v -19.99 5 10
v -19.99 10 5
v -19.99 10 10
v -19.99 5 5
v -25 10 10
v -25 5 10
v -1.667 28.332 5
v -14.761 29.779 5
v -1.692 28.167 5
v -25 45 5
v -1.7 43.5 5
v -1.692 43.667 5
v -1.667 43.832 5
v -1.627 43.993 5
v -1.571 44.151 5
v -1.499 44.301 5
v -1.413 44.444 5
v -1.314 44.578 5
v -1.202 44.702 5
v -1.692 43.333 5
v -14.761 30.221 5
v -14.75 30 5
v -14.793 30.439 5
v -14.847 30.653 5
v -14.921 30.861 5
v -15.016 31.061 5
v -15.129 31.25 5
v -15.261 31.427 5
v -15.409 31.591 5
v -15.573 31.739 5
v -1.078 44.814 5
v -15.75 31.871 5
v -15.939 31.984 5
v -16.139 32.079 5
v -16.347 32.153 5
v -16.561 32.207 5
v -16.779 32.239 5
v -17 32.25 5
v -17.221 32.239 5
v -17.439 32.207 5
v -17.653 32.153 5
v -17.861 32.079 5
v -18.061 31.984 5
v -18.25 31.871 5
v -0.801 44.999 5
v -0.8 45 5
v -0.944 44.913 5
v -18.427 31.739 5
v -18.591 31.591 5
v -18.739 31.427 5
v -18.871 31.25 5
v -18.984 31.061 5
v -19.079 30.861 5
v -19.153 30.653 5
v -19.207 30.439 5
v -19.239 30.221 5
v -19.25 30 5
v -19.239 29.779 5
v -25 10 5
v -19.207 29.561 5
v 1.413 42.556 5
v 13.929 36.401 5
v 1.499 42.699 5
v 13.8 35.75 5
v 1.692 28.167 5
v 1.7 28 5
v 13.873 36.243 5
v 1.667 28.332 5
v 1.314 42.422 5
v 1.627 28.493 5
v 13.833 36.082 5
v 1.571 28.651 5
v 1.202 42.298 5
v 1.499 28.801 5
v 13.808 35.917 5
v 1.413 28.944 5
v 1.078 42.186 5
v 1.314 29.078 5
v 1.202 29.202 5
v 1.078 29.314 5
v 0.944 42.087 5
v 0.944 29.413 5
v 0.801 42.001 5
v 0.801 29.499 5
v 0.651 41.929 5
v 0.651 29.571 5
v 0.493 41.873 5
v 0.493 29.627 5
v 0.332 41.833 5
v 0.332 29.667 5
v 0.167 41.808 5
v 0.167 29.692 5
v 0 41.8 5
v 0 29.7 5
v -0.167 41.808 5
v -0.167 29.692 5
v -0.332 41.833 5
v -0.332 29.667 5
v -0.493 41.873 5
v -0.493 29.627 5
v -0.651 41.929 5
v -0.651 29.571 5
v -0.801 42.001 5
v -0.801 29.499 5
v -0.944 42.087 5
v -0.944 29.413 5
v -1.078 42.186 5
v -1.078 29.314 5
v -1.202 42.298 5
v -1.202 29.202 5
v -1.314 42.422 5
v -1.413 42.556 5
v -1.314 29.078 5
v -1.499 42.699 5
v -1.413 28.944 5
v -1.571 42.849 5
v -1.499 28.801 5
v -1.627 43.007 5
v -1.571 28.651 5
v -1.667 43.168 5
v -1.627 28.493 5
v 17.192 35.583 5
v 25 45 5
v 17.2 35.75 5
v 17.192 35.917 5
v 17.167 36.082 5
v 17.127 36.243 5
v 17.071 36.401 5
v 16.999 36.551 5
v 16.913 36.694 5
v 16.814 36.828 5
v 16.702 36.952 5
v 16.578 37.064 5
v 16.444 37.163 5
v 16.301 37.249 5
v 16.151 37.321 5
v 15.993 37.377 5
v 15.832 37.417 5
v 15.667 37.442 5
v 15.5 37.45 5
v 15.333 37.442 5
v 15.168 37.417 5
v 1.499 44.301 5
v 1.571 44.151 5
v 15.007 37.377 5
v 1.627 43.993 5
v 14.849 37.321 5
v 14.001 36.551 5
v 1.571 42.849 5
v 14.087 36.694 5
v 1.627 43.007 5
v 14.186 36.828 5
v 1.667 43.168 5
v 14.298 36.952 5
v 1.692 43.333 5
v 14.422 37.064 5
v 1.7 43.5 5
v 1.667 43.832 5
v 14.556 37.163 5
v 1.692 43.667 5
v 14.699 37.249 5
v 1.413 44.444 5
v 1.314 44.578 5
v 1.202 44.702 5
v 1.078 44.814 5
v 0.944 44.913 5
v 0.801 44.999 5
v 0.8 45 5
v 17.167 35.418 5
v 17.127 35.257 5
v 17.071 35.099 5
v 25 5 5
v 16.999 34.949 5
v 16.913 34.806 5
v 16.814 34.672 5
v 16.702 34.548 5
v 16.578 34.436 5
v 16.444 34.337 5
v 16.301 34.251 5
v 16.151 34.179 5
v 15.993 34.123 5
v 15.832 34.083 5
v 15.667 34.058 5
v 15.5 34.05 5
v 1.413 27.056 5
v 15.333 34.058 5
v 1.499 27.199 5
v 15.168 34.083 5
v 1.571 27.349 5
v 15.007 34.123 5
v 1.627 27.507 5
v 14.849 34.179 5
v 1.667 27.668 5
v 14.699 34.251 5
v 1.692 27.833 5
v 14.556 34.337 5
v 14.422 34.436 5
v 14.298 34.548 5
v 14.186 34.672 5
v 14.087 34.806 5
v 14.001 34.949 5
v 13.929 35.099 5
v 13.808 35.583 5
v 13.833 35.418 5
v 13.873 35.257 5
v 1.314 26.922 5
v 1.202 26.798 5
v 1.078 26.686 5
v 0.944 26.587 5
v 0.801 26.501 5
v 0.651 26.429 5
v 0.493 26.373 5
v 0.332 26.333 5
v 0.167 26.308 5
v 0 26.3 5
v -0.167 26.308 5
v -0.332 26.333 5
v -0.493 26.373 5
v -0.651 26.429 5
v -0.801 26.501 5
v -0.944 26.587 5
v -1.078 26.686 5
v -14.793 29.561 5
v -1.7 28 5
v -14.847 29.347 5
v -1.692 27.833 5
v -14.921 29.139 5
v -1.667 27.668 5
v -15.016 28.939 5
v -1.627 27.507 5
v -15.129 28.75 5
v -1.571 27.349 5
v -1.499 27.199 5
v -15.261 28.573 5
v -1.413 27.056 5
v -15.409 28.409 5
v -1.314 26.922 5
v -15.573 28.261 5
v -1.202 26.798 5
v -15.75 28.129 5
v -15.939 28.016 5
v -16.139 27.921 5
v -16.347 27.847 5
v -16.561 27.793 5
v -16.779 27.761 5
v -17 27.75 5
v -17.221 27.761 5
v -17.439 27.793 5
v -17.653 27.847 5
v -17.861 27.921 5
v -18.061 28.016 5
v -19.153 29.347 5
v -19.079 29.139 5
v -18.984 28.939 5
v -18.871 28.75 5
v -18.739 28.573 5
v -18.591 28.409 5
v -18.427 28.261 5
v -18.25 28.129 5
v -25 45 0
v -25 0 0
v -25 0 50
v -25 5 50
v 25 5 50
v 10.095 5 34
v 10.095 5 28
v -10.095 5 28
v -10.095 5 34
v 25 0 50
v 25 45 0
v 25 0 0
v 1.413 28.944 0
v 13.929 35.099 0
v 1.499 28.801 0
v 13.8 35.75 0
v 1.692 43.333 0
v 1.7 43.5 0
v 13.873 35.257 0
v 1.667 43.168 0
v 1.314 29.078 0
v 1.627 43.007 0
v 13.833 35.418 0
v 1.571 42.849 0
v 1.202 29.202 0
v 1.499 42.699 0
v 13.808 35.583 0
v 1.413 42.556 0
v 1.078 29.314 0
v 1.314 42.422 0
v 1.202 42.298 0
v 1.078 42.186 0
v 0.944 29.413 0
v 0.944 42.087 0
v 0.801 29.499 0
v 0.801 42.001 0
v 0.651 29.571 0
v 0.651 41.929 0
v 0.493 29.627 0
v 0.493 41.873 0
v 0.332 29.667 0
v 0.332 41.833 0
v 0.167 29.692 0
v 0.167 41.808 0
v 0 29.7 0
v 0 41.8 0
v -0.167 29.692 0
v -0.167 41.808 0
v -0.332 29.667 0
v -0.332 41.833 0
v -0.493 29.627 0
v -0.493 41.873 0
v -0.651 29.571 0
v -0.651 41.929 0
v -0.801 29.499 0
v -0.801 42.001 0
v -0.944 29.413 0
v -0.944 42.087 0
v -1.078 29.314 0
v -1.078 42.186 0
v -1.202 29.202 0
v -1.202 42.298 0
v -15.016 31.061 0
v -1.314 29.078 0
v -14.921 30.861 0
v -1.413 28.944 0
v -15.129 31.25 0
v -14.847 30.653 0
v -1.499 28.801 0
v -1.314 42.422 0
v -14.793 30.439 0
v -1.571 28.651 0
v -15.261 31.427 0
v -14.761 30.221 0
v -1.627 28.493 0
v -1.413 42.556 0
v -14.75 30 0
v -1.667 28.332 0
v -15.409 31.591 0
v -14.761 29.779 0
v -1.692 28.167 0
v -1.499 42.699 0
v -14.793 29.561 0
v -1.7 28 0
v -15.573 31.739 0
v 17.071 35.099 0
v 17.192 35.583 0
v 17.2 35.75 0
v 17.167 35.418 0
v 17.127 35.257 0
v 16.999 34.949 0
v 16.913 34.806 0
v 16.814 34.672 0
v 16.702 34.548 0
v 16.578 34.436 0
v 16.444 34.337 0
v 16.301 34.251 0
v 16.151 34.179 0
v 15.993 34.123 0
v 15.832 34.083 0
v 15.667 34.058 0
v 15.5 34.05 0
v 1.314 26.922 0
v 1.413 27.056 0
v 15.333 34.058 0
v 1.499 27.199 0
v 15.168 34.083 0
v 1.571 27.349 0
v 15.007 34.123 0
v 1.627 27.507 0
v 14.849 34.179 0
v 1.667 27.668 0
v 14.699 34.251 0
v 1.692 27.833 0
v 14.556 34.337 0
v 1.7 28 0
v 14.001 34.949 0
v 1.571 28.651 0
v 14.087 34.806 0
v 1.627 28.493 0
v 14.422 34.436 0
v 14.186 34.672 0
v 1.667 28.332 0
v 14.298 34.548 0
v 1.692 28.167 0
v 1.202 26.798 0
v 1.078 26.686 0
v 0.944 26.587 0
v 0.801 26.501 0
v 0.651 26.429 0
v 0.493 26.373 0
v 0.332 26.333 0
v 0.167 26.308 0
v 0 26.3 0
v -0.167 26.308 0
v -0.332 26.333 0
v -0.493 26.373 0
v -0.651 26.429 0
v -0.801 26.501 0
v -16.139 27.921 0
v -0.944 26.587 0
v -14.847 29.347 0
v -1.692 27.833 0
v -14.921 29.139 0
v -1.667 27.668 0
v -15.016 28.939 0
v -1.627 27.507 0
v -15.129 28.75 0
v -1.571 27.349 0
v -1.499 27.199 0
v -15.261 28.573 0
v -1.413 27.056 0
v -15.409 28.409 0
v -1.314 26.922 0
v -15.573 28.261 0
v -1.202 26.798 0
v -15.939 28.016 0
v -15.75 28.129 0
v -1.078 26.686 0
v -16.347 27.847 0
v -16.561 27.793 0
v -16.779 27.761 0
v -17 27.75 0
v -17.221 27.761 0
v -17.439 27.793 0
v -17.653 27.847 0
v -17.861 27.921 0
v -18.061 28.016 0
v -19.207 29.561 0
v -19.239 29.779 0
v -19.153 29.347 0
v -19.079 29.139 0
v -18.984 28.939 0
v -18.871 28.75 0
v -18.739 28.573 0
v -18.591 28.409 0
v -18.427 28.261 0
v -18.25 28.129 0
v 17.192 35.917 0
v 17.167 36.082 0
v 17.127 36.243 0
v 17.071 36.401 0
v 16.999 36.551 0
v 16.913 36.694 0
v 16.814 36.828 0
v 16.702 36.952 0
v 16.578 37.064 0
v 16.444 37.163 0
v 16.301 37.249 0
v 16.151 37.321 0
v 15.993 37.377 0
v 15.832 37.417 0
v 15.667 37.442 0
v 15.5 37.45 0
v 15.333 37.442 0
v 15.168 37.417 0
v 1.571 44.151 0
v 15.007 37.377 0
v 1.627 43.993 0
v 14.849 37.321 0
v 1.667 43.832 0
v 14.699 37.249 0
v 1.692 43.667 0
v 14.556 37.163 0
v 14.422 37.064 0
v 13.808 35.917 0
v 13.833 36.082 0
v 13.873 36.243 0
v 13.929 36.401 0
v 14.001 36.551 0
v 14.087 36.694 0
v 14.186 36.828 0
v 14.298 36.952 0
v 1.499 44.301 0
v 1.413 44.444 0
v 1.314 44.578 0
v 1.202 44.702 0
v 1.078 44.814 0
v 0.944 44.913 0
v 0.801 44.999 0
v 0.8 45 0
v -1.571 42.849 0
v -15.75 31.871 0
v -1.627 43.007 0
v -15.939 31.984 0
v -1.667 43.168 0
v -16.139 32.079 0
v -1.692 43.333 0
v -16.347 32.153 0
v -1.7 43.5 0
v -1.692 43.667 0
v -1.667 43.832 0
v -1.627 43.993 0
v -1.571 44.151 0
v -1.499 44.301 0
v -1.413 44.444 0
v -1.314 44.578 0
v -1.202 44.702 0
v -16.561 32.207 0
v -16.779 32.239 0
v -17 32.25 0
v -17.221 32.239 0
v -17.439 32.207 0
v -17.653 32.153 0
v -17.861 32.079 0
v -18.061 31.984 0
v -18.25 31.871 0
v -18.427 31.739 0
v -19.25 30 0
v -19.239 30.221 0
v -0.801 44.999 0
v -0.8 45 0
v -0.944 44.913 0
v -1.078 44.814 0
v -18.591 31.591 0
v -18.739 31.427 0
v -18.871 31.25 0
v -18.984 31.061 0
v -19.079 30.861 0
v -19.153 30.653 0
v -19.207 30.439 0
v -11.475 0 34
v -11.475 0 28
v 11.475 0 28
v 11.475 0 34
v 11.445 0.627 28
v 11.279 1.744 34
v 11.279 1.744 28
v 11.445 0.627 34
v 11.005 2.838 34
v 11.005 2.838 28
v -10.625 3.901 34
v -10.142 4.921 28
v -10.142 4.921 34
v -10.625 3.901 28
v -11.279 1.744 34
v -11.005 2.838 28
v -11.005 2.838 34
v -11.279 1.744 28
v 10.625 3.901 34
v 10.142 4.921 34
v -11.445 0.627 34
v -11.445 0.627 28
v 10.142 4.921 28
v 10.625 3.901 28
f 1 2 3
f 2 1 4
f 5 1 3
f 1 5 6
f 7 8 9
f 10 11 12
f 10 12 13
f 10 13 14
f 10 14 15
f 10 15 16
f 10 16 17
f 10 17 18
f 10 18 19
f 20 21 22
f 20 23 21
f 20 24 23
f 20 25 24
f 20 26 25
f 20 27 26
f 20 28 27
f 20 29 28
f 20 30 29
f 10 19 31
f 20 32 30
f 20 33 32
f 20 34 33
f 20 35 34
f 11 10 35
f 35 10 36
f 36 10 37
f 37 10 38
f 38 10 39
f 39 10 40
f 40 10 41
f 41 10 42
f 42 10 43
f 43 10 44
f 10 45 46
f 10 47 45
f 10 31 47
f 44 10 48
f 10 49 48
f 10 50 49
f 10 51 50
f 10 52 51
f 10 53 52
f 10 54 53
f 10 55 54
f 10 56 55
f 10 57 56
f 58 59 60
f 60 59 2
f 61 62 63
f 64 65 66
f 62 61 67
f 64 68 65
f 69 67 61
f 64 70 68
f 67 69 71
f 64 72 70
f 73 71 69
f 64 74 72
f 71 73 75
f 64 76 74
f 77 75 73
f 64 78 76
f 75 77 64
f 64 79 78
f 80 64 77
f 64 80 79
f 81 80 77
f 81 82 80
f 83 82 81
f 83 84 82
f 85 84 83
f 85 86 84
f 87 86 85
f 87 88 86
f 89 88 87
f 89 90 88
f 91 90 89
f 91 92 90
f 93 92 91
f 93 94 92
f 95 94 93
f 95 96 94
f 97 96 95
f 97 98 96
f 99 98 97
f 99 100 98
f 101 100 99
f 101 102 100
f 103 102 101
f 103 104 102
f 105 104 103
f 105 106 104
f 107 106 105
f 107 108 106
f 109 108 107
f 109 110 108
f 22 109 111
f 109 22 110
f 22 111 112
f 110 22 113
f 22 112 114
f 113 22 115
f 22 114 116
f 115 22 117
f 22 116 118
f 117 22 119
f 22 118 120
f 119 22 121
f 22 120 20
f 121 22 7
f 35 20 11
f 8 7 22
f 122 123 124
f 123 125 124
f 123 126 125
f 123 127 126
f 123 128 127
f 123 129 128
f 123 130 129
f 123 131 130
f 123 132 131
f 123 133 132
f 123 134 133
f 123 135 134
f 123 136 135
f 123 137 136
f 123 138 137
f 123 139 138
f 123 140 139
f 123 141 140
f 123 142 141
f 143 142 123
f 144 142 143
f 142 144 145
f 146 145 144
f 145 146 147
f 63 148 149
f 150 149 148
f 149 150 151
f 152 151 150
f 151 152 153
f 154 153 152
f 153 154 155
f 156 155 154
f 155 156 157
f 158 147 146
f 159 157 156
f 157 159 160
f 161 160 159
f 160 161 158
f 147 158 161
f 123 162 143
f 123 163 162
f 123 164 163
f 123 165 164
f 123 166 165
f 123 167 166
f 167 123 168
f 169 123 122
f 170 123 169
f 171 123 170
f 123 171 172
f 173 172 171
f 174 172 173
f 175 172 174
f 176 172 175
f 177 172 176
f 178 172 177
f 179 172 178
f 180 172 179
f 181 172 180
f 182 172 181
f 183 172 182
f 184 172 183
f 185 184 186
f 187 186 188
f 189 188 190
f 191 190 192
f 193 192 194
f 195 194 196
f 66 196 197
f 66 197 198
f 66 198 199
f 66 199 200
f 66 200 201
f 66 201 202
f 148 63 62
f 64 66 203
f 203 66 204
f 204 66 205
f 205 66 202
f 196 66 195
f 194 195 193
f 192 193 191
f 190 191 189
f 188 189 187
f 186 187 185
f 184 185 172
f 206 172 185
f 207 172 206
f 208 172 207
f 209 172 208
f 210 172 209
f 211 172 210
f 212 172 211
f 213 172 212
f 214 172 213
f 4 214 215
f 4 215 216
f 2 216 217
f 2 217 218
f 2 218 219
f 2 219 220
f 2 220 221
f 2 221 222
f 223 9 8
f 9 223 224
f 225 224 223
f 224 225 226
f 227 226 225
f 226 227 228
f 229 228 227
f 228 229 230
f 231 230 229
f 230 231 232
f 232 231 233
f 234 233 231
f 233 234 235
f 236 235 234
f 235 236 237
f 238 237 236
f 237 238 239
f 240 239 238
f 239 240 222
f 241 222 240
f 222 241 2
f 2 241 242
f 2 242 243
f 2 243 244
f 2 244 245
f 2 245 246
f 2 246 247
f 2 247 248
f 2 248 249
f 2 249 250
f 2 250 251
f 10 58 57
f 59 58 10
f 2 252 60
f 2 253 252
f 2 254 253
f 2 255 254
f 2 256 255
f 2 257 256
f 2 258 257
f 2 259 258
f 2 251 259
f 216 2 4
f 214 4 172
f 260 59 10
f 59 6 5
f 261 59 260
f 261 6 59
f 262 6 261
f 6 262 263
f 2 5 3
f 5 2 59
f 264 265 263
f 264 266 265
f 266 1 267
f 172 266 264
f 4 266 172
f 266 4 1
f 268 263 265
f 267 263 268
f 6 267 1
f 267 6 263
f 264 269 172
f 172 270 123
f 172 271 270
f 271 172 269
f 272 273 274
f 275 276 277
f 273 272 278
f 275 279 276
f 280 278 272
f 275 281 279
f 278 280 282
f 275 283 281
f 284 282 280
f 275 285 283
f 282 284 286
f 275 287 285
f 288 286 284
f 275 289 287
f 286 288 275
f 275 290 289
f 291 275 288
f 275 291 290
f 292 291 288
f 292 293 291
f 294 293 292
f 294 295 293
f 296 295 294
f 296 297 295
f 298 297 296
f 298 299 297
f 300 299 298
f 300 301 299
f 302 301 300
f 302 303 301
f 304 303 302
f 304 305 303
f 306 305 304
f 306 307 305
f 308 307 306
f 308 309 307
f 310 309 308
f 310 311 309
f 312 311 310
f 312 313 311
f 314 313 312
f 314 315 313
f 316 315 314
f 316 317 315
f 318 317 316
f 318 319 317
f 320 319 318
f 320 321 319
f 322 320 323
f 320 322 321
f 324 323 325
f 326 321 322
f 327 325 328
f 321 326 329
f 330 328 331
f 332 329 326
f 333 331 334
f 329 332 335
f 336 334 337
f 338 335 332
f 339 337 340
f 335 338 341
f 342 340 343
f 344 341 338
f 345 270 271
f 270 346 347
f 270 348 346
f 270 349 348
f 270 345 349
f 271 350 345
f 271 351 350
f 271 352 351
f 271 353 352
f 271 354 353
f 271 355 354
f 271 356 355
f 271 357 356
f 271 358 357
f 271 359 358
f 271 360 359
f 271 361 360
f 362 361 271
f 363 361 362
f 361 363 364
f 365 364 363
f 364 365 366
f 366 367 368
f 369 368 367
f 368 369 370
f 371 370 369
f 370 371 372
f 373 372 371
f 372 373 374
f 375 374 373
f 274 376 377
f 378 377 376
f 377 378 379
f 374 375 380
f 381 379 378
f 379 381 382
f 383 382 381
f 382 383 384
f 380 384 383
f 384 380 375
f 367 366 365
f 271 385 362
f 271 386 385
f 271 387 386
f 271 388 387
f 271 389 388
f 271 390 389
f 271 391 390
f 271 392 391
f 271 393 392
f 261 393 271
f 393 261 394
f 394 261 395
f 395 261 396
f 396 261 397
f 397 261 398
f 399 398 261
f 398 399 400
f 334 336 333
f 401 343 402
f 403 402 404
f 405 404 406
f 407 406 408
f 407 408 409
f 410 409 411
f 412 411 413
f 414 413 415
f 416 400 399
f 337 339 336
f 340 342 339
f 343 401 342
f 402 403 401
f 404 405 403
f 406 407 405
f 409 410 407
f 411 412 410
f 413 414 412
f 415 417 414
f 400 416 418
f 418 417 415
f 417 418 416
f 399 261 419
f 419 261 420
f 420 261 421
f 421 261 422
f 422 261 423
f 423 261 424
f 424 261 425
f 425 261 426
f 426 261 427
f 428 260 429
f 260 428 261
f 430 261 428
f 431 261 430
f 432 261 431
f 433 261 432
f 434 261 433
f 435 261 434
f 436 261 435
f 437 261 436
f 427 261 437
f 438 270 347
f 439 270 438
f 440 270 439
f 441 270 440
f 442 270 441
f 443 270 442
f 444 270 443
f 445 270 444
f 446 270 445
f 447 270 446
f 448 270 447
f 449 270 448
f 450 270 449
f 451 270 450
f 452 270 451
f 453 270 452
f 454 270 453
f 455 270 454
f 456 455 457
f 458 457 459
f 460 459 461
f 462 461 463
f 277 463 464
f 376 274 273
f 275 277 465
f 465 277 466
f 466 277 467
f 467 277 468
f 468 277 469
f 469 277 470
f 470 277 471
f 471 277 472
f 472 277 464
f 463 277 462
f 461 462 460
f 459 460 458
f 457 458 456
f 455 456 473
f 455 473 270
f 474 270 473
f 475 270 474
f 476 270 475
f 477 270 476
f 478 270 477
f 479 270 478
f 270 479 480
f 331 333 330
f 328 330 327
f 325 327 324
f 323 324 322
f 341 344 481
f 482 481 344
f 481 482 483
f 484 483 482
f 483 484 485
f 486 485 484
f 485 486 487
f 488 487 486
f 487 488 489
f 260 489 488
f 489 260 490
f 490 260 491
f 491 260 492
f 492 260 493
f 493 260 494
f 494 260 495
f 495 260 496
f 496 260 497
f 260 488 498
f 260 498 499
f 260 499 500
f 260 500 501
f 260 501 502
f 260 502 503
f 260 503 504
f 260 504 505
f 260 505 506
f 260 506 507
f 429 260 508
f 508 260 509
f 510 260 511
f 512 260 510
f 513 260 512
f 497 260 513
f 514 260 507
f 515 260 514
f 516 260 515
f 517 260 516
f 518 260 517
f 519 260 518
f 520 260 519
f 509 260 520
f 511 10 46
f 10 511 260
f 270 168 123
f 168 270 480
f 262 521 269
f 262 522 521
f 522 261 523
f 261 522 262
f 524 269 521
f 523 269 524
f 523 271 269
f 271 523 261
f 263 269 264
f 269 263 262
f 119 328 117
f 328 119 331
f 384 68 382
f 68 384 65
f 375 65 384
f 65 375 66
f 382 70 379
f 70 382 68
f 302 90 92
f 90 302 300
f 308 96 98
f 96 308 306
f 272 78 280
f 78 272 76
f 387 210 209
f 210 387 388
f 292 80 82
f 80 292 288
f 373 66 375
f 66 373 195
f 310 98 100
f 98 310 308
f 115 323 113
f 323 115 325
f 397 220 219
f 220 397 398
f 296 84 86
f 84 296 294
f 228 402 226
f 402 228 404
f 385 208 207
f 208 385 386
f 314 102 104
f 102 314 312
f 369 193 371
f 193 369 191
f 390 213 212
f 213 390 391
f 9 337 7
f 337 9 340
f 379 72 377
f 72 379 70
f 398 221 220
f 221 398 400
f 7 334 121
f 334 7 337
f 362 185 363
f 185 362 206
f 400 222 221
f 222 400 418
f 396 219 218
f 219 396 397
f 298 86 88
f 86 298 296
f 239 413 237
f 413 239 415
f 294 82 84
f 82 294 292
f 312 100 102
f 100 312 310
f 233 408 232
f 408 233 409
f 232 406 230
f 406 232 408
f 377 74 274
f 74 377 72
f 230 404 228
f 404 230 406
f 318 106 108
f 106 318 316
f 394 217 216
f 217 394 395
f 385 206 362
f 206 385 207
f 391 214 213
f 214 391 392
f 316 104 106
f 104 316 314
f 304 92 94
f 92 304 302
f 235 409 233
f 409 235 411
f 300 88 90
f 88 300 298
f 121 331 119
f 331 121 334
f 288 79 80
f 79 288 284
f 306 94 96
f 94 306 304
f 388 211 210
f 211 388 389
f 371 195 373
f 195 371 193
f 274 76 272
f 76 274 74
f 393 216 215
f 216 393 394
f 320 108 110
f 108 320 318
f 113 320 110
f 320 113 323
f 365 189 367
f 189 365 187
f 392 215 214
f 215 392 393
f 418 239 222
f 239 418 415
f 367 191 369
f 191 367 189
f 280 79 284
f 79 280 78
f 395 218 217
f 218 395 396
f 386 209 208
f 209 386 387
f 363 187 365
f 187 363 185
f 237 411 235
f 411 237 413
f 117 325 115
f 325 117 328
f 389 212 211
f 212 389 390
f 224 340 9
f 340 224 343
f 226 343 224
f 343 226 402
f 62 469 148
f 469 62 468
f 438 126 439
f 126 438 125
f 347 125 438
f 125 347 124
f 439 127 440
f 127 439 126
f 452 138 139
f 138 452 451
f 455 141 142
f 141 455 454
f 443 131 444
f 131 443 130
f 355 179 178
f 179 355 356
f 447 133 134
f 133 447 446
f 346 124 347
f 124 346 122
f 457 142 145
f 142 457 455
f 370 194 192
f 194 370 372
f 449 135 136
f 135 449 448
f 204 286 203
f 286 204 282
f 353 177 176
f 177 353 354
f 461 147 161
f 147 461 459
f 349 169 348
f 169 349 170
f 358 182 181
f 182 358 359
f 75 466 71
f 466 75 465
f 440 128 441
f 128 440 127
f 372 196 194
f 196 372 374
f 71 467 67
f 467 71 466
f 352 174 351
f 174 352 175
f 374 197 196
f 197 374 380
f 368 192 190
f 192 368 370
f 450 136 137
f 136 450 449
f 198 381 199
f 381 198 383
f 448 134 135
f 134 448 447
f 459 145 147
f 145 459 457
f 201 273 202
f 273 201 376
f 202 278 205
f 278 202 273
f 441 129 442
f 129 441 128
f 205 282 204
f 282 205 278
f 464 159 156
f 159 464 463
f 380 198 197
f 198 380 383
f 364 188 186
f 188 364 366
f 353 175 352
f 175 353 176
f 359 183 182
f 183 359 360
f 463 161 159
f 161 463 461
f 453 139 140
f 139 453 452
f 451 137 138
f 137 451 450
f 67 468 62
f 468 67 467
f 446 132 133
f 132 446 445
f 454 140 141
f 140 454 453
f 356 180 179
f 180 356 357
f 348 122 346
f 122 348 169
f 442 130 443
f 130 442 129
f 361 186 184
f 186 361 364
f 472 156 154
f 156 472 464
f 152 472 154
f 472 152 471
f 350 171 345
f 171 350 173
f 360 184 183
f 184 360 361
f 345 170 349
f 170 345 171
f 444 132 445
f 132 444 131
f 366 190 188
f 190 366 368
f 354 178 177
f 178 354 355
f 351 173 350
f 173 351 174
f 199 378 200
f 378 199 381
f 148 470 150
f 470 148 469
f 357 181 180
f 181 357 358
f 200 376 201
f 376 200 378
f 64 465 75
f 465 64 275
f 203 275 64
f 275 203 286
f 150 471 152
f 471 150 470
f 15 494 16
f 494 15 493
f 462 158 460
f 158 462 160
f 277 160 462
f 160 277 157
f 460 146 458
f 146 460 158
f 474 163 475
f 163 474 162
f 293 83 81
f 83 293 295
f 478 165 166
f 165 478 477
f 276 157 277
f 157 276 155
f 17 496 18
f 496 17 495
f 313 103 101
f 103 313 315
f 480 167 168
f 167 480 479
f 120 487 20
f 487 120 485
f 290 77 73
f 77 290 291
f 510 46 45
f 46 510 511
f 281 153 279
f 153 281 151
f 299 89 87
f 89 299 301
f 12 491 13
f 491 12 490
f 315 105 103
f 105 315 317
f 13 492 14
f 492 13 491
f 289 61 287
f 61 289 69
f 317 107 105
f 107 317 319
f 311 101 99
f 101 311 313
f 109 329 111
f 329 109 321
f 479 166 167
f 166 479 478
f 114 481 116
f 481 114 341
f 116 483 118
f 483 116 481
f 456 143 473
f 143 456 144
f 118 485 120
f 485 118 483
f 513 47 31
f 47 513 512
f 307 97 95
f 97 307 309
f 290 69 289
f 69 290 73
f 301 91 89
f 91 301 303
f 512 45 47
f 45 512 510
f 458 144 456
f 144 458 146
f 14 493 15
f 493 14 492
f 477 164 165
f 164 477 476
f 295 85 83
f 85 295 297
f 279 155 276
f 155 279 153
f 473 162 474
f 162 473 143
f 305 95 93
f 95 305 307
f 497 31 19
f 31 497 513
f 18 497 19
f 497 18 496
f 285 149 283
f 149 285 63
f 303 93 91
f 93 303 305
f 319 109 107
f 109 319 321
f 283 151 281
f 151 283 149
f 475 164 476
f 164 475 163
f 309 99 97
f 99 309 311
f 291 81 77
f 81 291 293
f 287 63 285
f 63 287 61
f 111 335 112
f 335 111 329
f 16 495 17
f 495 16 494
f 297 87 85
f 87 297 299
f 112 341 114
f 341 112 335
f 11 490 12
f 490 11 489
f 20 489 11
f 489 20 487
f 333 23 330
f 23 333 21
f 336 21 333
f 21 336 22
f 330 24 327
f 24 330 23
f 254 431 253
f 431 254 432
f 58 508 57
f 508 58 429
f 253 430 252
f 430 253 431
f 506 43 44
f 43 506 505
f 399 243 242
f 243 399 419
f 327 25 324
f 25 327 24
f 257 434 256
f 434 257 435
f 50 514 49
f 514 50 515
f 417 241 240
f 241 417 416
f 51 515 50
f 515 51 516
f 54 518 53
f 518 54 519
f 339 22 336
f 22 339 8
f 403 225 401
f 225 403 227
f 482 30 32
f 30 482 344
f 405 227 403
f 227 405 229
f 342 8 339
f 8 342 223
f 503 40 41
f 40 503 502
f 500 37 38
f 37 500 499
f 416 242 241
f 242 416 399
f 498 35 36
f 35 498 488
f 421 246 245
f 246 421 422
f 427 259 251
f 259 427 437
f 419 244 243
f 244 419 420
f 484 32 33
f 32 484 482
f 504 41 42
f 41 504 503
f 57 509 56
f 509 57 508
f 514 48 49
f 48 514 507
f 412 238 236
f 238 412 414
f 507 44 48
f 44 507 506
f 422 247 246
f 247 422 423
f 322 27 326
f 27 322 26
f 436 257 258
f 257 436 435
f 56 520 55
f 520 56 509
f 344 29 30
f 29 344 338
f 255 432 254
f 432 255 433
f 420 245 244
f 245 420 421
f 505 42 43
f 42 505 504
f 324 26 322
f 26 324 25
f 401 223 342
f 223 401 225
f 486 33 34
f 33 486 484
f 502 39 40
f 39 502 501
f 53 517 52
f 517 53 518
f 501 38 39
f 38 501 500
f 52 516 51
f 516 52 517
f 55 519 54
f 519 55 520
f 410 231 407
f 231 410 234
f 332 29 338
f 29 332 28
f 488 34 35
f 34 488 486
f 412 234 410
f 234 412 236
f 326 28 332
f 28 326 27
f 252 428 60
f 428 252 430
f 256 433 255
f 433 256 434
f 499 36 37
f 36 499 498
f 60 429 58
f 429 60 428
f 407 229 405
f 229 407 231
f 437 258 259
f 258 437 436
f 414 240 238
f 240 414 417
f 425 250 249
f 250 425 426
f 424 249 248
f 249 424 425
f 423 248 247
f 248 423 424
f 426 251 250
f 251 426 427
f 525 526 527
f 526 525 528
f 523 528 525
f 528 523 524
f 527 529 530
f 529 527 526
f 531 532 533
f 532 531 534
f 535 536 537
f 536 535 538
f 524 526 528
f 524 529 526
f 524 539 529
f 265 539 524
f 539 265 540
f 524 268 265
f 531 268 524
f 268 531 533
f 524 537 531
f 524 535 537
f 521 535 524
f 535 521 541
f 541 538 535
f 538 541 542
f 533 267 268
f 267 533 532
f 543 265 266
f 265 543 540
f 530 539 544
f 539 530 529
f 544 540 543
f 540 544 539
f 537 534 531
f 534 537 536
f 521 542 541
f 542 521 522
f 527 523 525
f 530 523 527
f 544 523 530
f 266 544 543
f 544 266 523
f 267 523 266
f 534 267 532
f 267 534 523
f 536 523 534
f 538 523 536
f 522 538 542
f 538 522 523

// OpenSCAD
// L-shaped mounting bracket for NEMA 17 stepper motor (syringe pump)
// Print orientation: base plate on bed, motor plate building upward (+Z)

// ---------- Parameters ----------
base_x0   = -25;  // base plate X start
base_x1   = 25;   // base plate X end
base_y0   = 0;    // base plate Y start
base_y1   = 45;   // base plate Y end
base_z0   = 0;    // base plate Z start
base_z1   = 5;    // base plate Z end

hole_m4_x = -17;  // M4 through-hole X position
hole_m4_y = 30;   // M4 through-hole Y position

motor_x0  = -25;  // motor plate X start
motor_x1  = 25;   // motor plate X end
motor_y0  = 0;    // motor plate Y start
motor_y1  = 5;    // motor plate Y end
motor_z0  = 0;    // motor plate Z start
motor_z1  = 50;   // motor plate Z end

boss_d    = 23;   // motor boss hole diameter
boss_x    = 0;    // boss hole X centre
boss_z    = 28;   // boss hole Z centre

screw_d   = 3.4;  // M3 screw holes diameter
screw_n   = 4;    // number of screw holes
screw_p   = 31;   // square pattern size (centre to centre)

gusset_t  = 5;    // gusset thickness
gusset_x0 = -25;  // gusset left edge
gusset_x1 = -20;  // gusset right edge (left triangle)
gusset_y0 = 5;    // triangle leg along Y
gusset_z0 = 5;    // triangle leg along Z

eps       = 0.5;  // cutter overshoot past faces

$fn = 64;

// ---------- Model ----------
difference() {
    union() {
        // Base plate
        translate([base_x0, base_y0, base_z0])
            cube([base_x1 - base_x0, base_y1 - base_y0, base_z1 - base_z0]);

        // Motor plate
        translate([motor_x0, motor_y0, motor_z0])
            cube([motor_x1 - motor_x0, motor_y1 - motor_y0, motor_z1 - motor_z0]);

        // Gussets (right triangles in YZ plane, flush with left/right edges)
        for (gx = [gusset_x0, gusset_x1 - 0.01])
            translate([gx, gusset_y0, gusset_z0])
                cube([gusset_x1 - gx + 0.01, gusset_y0, gusset_z0]);
    }

    // Base plate M4 holes
    translate([hole_m4_x, hole_m4_y, -eps])
        cylinder(d = 4.5, h = base_z1 - base_z0 + 2 * eps);

    // Motor boss hole (along Y)
    translate([boss_x, -eps, boss_z])
        cylinder(d = boss_d, h = motor_y1 - motor_y0 + 2 * eps);

    // M3 screw holes on square pattern
    for (i = [0 : screw_n - 1]) {
        x = boss_x + (i % 2) * (screw_p / 2);
        y = boss_z + (i / 2) * (screw_p / 2);
        translate([x, y, -eps])
            cylinder(d = screw_d, h = motor_z1 - motor_z0 + 2 * eps);
    }
}
